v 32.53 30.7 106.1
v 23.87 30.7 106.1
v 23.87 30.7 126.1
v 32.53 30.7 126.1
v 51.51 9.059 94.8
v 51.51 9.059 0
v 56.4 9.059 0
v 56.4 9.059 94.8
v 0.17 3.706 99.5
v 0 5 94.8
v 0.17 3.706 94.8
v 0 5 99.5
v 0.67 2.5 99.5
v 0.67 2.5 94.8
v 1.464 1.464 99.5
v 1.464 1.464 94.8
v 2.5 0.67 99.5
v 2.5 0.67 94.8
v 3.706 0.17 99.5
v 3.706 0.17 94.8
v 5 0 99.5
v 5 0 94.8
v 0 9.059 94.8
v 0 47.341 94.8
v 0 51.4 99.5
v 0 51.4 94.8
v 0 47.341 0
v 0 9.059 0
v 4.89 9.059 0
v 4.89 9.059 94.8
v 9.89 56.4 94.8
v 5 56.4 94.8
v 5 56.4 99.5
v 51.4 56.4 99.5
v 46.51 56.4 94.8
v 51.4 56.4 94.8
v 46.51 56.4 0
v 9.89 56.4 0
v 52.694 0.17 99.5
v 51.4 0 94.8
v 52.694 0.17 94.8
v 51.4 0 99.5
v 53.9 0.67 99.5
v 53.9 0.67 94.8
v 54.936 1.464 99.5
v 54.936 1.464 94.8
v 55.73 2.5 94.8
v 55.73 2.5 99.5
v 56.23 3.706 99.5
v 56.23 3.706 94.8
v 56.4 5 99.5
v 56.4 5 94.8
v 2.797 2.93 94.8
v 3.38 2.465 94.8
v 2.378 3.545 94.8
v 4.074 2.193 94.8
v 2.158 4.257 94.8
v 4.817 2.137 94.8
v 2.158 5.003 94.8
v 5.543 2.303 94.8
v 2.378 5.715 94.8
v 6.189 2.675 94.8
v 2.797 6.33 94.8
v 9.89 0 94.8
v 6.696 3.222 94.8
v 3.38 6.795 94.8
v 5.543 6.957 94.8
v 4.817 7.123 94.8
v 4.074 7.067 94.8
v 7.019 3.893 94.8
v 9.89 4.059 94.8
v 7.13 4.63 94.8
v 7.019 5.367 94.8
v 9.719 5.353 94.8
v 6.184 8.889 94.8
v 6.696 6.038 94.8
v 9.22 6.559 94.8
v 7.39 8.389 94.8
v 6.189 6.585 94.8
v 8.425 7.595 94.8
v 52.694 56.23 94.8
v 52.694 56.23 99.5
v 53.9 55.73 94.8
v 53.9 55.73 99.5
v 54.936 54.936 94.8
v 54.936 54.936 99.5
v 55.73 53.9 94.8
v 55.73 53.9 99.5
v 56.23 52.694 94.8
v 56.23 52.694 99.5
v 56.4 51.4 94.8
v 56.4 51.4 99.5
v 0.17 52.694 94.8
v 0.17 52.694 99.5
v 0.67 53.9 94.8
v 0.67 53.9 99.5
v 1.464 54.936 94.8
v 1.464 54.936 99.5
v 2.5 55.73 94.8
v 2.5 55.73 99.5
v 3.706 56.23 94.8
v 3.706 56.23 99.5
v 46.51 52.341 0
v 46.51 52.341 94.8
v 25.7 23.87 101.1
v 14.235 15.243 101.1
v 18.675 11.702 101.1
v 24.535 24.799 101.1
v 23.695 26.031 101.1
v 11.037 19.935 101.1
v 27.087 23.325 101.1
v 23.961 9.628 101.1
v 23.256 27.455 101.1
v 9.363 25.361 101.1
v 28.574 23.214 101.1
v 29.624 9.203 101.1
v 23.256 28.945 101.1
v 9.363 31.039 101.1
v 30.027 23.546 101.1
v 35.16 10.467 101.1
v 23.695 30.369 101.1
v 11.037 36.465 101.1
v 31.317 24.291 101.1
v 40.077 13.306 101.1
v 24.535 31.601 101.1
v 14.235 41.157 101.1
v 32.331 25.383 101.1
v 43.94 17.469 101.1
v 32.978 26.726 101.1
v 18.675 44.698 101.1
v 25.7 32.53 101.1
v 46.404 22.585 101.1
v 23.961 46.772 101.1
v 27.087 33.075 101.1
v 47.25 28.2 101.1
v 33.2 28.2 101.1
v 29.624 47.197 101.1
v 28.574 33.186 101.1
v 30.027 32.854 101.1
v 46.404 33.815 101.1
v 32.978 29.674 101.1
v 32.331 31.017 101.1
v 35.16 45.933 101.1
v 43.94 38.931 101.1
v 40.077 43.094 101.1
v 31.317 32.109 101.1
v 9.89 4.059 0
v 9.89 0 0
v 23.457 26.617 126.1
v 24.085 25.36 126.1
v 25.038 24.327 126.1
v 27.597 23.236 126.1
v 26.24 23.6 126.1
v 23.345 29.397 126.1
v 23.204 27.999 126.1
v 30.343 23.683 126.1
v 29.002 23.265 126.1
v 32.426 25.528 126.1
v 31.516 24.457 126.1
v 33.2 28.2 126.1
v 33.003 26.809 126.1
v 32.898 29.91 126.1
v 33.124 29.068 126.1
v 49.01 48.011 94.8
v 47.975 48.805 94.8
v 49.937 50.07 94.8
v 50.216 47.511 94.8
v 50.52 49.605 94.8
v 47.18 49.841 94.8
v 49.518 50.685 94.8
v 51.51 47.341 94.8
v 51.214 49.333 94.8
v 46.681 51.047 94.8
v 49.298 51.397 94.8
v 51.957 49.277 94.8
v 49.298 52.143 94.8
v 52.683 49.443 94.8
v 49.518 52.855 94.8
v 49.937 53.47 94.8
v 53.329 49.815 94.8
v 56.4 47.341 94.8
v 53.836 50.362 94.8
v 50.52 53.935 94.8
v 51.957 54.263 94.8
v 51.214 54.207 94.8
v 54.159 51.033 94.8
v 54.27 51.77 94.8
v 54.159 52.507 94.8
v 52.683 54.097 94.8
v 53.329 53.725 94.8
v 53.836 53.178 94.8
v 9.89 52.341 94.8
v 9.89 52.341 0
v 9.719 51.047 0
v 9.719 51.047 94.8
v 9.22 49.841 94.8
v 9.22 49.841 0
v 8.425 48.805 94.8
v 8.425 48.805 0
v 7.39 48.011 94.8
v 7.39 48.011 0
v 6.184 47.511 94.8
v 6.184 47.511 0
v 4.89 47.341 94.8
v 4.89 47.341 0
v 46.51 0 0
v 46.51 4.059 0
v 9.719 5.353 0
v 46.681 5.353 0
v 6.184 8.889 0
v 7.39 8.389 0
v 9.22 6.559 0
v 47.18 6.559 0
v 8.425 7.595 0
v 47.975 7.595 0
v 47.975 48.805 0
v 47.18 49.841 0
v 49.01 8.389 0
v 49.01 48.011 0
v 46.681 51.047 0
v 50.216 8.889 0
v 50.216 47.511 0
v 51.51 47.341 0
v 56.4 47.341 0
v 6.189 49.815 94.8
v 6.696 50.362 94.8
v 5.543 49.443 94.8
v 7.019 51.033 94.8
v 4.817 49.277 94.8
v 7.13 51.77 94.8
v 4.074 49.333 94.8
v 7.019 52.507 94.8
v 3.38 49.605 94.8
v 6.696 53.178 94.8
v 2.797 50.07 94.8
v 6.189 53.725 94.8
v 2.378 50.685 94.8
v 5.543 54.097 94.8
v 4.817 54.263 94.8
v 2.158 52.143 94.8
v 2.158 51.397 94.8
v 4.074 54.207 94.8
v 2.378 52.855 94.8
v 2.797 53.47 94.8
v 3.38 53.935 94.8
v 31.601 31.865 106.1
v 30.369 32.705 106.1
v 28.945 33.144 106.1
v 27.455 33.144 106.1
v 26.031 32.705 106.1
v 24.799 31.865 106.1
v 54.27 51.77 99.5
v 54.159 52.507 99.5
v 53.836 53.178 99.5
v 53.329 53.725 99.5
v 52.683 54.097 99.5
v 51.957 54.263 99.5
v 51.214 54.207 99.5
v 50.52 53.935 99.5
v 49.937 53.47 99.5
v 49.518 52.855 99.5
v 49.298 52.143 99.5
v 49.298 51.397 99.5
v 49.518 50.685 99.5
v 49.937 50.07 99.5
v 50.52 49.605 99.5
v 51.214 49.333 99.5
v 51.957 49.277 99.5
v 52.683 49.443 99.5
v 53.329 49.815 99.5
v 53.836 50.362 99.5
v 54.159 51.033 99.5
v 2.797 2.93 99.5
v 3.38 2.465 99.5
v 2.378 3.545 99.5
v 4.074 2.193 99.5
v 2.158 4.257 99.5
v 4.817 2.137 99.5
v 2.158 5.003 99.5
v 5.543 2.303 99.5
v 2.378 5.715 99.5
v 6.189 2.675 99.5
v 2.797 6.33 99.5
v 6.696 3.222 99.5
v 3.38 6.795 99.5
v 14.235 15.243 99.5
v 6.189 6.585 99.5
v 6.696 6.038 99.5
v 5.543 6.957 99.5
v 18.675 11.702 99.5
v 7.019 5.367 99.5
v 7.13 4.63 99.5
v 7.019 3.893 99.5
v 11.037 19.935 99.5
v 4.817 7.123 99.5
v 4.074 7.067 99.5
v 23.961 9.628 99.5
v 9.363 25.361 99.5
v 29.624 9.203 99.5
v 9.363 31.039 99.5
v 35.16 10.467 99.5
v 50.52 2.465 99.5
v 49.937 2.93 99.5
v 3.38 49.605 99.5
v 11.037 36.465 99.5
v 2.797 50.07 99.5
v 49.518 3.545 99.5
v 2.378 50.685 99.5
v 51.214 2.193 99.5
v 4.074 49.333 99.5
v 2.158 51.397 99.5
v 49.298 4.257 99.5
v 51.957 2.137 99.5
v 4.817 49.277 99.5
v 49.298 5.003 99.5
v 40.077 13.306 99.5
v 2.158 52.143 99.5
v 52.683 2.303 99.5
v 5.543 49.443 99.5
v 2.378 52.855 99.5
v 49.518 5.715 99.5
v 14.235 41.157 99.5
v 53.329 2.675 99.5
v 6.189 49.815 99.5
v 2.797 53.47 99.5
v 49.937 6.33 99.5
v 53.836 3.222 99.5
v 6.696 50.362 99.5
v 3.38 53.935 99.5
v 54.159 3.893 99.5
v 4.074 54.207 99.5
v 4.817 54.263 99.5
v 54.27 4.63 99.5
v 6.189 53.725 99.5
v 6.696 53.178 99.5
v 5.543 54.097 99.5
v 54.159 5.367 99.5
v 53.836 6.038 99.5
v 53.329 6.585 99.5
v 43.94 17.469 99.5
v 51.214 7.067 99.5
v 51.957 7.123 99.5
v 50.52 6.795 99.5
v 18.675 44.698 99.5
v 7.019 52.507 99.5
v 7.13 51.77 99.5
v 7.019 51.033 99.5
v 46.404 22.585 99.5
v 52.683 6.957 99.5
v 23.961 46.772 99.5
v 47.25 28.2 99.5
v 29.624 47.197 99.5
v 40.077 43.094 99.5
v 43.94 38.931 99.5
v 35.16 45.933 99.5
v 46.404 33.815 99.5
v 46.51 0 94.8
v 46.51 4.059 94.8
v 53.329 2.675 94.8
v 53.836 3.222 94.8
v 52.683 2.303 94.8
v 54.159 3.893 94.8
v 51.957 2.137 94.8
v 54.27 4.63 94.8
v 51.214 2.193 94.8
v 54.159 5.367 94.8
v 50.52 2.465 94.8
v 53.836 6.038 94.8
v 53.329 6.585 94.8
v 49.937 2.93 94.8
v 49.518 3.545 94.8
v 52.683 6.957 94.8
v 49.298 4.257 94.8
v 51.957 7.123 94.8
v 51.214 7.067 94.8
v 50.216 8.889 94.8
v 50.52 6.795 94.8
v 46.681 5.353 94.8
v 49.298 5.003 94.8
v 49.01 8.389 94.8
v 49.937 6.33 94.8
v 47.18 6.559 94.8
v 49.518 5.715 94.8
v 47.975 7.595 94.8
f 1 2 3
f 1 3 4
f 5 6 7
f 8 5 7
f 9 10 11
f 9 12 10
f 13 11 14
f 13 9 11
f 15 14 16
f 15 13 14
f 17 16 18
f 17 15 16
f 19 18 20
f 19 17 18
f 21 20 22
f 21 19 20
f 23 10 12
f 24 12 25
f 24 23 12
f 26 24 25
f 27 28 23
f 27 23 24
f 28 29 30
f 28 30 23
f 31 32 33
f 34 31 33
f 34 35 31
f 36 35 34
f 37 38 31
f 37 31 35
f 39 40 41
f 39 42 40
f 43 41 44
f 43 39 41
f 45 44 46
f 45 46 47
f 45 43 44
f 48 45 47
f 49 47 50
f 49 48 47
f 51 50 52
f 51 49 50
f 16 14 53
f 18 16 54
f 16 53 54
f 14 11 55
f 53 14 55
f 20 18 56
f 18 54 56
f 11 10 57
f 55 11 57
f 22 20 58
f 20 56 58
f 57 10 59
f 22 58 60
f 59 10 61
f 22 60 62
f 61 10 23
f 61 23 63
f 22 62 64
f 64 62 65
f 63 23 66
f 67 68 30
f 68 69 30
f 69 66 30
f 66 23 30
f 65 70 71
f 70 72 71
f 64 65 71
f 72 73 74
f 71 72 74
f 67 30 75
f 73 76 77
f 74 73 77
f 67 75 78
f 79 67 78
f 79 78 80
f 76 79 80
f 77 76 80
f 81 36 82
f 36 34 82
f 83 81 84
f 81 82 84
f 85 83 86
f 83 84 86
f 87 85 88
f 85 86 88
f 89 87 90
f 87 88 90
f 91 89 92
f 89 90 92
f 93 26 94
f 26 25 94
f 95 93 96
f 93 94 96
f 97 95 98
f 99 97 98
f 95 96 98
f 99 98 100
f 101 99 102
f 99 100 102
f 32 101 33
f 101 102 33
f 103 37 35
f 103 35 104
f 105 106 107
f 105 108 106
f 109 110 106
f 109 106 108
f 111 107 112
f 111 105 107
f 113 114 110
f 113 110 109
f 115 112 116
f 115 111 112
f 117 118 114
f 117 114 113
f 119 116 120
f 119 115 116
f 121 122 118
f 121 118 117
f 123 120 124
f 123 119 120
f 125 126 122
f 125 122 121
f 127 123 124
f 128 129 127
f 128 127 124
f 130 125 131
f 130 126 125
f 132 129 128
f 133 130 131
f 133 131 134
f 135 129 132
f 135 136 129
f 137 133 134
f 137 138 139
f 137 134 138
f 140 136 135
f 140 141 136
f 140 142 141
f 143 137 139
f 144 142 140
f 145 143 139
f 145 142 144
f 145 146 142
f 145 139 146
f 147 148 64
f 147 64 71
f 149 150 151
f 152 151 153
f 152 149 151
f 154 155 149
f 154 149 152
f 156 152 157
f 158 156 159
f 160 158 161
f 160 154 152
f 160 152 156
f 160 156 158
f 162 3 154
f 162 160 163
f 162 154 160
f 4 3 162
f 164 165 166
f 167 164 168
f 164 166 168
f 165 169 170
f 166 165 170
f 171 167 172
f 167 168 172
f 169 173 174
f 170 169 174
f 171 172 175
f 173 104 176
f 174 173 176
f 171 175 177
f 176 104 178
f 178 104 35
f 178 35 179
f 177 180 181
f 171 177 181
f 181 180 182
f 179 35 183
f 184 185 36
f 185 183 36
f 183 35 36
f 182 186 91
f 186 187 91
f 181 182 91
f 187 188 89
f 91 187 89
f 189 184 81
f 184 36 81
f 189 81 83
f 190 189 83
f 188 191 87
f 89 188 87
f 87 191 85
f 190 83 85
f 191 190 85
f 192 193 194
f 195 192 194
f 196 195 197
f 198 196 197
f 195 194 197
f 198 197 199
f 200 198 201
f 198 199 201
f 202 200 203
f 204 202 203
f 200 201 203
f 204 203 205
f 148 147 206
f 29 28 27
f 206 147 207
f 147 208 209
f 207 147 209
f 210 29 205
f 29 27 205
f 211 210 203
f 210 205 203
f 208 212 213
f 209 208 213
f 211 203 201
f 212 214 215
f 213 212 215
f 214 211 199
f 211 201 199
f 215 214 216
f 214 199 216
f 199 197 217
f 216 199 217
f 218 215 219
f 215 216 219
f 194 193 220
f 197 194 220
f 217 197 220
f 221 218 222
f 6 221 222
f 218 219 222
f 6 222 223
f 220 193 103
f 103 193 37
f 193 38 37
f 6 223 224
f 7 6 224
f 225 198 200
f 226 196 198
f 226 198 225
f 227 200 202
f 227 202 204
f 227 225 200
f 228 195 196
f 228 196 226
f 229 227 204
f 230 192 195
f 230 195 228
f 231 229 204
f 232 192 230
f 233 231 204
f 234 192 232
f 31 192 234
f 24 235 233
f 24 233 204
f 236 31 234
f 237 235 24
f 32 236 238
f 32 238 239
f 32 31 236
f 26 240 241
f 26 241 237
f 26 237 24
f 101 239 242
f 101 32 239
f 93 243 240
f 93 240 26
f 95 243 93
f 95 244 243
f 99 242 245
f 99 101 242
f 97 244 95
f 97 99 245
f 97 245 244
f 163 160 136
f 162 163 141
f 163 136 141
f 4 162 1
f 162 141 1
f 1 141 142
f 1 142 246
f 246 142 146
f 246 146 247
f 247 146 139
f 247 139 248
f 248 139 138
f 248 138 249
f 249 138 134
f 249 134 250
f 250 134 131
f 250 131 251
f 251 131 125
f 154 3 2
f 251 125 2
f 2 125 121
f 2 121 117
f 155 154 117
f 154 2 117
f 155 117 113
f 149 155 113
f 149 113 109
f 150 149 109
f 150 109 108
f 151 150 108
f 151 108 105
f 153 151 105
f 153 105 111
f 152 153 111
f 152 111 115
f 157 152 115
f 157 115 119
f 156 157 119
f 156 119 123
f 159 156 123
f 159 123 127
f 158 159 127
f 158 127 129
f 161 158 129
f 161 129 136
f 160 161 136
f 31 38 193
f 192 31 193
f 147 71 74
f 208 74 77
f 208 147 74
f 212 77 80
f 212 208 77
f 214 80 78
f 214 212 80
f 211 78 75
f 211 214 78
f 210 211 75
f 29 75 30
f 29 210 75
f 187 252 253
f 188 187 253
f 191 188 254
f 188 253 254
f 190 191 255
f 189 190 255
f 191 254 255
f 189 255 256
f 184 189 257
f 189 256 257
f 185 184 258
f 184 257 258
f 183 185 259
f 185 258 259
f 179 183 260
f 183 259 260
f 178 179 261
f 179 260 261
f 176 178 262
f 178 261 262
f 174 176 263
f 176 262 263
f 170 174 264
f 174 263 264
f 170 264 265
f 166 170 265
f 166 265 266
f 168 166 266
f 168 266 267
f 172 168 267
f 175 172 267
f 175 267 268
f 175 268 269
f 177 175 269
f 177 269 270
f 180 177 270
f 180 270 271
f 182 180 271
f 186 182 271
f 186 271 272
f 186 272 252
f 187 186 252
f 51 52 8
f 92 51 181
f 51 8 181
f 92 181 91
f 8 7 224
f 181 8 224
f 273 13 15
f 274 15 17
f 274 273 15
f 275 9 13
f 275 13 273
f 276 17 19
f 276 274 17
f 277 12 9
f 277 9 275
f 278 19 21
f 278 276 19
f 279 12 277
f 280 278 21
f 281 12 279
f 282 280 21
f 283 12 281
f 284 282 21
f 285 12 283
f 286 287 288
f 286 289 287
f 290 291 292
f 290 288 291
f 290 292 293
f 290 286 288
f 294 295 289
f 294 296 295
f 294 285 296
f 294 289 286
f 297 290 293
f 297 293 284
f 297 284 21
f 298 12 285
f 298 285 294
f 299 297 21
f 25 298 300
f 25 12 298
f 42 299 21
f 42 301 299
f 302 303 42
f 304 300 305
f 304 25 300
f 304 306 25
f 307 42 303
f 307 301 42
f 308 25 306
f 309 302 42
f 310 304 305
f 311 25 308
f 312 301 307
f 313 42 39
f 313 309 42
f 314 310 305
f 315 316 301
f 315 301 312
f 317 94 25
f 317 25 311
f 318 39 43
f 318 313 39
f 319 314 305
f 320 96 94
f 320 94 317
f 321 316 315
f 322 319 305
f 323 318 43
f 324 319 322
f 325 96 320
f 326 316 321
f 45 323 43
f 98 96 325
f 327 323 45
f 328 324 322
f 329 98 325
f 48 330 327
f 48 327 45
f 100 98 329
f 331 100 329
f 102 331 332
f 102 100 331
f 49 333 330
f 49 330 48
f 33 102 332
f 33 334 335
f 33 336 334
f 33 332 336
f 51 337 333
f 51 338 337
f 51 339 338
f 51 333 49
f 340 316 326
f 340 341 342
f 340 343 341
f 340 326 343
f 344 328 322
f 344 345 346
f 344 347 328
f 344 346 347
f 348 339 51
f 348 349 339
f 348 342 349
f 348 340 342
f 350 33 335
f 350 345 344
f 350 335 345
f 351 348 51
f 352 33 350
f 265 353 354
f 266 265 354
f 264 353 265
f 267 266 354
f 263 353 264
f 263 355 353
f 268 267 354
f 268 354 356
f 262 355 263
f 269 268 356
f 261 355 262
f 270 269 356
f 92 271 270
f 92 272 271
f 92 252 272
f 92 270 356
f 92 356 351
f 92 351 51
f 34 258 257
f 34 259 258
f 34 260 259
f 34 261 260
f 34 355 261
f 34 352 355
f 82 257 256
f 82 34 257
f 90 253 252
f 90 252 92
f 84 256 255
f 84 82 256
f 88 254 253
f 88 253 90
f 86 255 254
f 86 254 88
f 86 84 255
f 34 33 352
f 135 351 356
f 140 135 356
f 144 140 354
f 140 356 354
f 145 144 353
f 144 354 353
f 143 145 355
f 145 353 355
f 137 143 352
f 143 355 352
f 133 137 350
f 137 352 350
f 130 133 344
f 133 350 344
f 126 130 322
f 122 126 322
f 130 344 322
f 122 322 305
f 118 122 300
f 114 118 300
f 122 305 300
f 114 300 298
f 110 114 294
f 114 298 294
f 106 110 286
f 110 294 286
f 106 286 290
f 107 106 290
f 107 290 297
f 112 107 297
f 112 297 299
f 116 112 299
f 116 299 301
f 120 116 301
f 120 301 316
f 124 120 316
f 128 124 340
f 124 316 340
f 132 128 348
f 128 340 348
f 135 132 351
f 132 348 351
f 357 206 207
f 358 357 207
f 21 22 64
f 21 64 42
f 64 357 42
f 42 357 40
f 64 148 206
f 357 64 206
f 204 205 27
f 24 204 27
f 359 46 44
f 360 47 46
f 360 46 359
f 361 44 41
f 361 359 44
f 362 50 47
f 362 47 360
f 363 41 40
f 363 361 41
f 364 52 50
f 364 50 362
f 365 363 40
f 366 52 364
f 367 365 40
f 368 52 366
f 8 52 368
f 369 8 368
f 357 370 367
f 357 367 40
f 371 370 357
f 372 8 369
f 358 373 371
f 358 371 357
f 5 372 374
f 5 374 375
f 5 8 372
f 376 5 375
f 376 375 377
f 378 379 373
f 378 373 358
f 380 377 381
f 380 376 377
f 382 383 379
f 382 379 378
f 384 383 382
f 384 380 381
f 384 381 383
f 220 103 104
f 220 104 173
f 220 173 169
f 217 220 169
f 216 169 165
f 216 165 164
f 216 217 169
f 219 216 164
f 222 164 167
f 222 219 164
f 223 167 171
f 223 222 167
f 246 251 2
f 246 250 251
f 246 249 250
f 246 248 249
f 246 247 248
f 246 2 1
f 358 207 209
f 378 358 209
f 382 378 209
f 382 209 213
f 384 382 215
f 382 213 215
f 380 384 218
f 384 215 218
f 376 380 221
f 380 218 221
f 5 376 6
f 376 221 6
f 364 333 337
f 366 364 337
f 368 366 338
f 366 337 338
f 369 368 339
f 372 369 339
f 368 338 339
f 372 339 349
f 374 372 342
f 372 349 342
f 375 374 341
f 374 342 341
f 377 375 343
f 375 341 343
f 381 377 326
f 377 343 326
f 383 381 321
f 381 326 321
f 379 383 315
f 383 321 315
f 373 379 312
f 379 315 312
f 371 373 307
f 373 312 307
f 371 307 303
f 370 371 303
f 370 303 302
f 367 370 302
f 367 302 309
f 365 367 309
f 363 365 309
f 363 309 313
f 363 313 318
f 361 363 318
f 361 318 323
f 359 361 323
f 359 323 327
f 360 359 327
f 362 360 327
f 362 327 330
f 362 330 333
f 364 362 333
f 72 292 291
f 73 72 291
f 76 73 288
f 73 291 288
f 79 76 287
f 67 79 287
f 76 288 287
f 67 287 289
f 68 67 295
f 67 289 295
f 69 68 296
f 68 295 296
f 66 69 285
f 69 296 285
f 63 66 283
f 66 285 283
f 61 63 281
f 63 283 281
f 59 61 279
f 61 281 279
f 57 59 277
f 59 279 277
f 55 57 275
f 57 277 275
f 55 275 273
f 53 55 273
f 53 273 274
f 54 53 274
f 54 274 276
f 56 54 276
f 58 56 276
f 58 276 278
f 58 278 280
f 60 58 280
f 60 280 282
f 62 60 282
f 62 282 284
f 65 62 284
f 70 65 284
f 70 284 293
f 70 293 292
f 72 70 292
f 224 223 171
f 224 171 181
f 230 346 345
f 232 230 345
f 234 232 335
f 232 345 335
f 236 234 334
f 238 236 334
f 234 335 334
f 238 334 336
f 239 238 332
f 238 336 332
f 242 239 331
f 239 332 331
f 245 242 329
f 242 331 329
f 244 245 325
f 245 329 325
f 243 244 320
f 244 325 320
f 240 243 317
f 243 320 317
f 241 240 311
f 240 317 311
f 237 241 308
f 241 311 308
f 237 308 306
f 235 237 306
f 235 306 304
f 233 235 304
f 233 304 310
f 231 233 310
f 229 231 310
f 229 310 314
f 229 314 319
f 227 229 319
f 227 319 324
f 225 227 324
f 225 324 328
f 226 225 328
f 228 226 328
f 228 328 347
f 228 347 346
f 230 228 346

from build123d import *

# Parameters (mm, degrees)
SKETCH_1_W          = 56.4
SKETCH_1_H          = 56.4
EXTRUDE_1_DEPTH     = 99.5
SKETCH_2_R          = 19.05
EXTRUDE_2_DEPTH     = 1.6
SKETCH_3_R          = 5
EXTRUDE_3_DEPTH     = 25
SKETCH_4_W          = 8.660254038
SKETCH_4_H          = 6.0292226
CUT_EXTRUDE_1_DEPTH = 20
CUT_EXTRUDE_2_DEPTH = 94.8
SKETCH_6_R          = 2.5
CUT_EXTRUDE_3_DEPTH = 94.8
FILLET_1_R          = 5


with BuildPart() as part:
    # 草图1 → 凸台-拉伸1 (new body)
    with BuildSketch(Plane.XY):
        with Locations((28.2, 28.2)):
            Rectangle(SKETCH_1_W, SKETCH_1_H)
    extrude(amount=EXTRUDE_1_DEPTH)

    # 草图2 → 凸台-拉伸2 (add)
    with BuildSketch(Plane.XY.offset(99.5)):
        with Locations((28.2, 28.2)):
            Circle(SKETCH_2_R)
    extrude(amount=EXTRUDE_2_DEPTH)

    # 草图3 → 凸台-拉伸3 (add)
    with BuildSketch(Plane.XY.offset(101.1)):
        with Locations((28.2, 28.2)):
            Circle(SKETCH_3_R)
    extrude(amount=EXTRUDE_3_DEPTH)

    # 草图4 → 切除-拉伸1 (cut)
    with BuildSketch(Plane.XY.offset(126.1)):
        with Locations((28.2, 33.7146113)):
            Rectangle(SKETCH_4_W, SKETCH_4_H)
    extrude(amount=-CUT_EXTRUDE_1_DEPTH, mode=Mode.SUBTRACT)

    # 草图5 → 切除-拉伸2 (cut)
    with BuildSketch(Plane(origin=(0, 0, 0), x_dir=(-1, 0, 0), z_dir=(0, 0, -1))):
        with BuildLine():
            Line((-61.988810655, 58.062513104), (-46.510137618, 58.062513104))
            Line((-46.510137618, 58.062513104), (-46.510137618, 52.340700561))
            ThreePointArc((-46.510137618, 52.340700561), (-47.974603712, 48.805166655), (-51.510137618, 47.340700561))
            Line((-51.510137618, 47.340700561), (-61.988810655, 47.340700561))
            Line((-61.988810655, 47.340700561), (-61.988810655, 58.062513104))
        make_face()
        with BuildLine():
            Line((-9.889862382, 58.062513104), (-9.889862382, 52.340700561))
            ThreePointArc((-9.889862382, 52.340700561), (-8.425396288, 48.805166655), (-4.889862382, 47.340700561))
            Line((-4.889862382, 47.340700561), (5.588810655, 47.340700561))
            Line((5.588810655, 47.340700561), (5.588810655, 58.062513104))
            Line((5.588810655, 58.062513104), (-9.889862382, 58.062513104))
        make_face()
        with BuildLine():
            Line((5.588810655, -1.662513104), (-9.889862382, -1.662513104))
            Line((-9.889862382, -1.662513104), (-9.889862382, 4.059299439))
            ThreePointArc((-9.889862382, 4.059299439), (-8.425396288, 7.594833345), (-4.889862382, 9.059299439))
            Line((-4.889862382, 9.059299439), (5.588810655, 9.059299439))
            Line((5.588810655, 9.059299439), (5.588810655, -1.662513104))
        make_face()
        with BuildLine():
            Line((-46.510137618, -1.662513104), (-46.510137618, 4.059299439))
            ThreePointArc((-46.510137618, 4.059299439), (-47.974603712, 7.594833345), (-51.510137618, 9.059299439))
            Line((-51.510137618, 9.059299439), (-61.988810655, 9.059299439))
            Line((-61.988810655, 9.059299439), (-61.988810655, -1.662513104))
            Line((-61.988810655, -1.662513104), (-46.510137618, -1.662513104))
        make_face()
    extrude(amount=-CUT_EXTRUDE_2_DEPTH, mode=Mode.SUBTRACT)

    # 草图6 → 切除-拉伸3 (cut)
    with BuildSketch(Plane.XY.offset(99.5)):
        with Locations((4.63, 51.77)):
            Circle(SKETCH_6_R)
        with Locations((51.77, 51.77)):
            Circle(SKETCH_6_R)
        with Locations((51.77, 4.63)):
            Circle(SKETCH_6_R)
        with Locations((4.63, 4.63)):
            Circle(SKETCH_6_R)
    extrude(amount=-CUT_EXTRUDE_3_DEPTH, mode=Mode.SUBTRACT)

    # 圆角1
    fillet_1_edges = [part.edges().sort_by_distance(p)[0] for p in [
        (0, 56.4, 97.15),
        (56.4, 56.4, 97.15),
        (56.4, 0, 97.15),
        (0, 0, 97.15),
    ]]
    fillet(fillet_1_edges, radius=FILLET_1_R)


solid = part.part
